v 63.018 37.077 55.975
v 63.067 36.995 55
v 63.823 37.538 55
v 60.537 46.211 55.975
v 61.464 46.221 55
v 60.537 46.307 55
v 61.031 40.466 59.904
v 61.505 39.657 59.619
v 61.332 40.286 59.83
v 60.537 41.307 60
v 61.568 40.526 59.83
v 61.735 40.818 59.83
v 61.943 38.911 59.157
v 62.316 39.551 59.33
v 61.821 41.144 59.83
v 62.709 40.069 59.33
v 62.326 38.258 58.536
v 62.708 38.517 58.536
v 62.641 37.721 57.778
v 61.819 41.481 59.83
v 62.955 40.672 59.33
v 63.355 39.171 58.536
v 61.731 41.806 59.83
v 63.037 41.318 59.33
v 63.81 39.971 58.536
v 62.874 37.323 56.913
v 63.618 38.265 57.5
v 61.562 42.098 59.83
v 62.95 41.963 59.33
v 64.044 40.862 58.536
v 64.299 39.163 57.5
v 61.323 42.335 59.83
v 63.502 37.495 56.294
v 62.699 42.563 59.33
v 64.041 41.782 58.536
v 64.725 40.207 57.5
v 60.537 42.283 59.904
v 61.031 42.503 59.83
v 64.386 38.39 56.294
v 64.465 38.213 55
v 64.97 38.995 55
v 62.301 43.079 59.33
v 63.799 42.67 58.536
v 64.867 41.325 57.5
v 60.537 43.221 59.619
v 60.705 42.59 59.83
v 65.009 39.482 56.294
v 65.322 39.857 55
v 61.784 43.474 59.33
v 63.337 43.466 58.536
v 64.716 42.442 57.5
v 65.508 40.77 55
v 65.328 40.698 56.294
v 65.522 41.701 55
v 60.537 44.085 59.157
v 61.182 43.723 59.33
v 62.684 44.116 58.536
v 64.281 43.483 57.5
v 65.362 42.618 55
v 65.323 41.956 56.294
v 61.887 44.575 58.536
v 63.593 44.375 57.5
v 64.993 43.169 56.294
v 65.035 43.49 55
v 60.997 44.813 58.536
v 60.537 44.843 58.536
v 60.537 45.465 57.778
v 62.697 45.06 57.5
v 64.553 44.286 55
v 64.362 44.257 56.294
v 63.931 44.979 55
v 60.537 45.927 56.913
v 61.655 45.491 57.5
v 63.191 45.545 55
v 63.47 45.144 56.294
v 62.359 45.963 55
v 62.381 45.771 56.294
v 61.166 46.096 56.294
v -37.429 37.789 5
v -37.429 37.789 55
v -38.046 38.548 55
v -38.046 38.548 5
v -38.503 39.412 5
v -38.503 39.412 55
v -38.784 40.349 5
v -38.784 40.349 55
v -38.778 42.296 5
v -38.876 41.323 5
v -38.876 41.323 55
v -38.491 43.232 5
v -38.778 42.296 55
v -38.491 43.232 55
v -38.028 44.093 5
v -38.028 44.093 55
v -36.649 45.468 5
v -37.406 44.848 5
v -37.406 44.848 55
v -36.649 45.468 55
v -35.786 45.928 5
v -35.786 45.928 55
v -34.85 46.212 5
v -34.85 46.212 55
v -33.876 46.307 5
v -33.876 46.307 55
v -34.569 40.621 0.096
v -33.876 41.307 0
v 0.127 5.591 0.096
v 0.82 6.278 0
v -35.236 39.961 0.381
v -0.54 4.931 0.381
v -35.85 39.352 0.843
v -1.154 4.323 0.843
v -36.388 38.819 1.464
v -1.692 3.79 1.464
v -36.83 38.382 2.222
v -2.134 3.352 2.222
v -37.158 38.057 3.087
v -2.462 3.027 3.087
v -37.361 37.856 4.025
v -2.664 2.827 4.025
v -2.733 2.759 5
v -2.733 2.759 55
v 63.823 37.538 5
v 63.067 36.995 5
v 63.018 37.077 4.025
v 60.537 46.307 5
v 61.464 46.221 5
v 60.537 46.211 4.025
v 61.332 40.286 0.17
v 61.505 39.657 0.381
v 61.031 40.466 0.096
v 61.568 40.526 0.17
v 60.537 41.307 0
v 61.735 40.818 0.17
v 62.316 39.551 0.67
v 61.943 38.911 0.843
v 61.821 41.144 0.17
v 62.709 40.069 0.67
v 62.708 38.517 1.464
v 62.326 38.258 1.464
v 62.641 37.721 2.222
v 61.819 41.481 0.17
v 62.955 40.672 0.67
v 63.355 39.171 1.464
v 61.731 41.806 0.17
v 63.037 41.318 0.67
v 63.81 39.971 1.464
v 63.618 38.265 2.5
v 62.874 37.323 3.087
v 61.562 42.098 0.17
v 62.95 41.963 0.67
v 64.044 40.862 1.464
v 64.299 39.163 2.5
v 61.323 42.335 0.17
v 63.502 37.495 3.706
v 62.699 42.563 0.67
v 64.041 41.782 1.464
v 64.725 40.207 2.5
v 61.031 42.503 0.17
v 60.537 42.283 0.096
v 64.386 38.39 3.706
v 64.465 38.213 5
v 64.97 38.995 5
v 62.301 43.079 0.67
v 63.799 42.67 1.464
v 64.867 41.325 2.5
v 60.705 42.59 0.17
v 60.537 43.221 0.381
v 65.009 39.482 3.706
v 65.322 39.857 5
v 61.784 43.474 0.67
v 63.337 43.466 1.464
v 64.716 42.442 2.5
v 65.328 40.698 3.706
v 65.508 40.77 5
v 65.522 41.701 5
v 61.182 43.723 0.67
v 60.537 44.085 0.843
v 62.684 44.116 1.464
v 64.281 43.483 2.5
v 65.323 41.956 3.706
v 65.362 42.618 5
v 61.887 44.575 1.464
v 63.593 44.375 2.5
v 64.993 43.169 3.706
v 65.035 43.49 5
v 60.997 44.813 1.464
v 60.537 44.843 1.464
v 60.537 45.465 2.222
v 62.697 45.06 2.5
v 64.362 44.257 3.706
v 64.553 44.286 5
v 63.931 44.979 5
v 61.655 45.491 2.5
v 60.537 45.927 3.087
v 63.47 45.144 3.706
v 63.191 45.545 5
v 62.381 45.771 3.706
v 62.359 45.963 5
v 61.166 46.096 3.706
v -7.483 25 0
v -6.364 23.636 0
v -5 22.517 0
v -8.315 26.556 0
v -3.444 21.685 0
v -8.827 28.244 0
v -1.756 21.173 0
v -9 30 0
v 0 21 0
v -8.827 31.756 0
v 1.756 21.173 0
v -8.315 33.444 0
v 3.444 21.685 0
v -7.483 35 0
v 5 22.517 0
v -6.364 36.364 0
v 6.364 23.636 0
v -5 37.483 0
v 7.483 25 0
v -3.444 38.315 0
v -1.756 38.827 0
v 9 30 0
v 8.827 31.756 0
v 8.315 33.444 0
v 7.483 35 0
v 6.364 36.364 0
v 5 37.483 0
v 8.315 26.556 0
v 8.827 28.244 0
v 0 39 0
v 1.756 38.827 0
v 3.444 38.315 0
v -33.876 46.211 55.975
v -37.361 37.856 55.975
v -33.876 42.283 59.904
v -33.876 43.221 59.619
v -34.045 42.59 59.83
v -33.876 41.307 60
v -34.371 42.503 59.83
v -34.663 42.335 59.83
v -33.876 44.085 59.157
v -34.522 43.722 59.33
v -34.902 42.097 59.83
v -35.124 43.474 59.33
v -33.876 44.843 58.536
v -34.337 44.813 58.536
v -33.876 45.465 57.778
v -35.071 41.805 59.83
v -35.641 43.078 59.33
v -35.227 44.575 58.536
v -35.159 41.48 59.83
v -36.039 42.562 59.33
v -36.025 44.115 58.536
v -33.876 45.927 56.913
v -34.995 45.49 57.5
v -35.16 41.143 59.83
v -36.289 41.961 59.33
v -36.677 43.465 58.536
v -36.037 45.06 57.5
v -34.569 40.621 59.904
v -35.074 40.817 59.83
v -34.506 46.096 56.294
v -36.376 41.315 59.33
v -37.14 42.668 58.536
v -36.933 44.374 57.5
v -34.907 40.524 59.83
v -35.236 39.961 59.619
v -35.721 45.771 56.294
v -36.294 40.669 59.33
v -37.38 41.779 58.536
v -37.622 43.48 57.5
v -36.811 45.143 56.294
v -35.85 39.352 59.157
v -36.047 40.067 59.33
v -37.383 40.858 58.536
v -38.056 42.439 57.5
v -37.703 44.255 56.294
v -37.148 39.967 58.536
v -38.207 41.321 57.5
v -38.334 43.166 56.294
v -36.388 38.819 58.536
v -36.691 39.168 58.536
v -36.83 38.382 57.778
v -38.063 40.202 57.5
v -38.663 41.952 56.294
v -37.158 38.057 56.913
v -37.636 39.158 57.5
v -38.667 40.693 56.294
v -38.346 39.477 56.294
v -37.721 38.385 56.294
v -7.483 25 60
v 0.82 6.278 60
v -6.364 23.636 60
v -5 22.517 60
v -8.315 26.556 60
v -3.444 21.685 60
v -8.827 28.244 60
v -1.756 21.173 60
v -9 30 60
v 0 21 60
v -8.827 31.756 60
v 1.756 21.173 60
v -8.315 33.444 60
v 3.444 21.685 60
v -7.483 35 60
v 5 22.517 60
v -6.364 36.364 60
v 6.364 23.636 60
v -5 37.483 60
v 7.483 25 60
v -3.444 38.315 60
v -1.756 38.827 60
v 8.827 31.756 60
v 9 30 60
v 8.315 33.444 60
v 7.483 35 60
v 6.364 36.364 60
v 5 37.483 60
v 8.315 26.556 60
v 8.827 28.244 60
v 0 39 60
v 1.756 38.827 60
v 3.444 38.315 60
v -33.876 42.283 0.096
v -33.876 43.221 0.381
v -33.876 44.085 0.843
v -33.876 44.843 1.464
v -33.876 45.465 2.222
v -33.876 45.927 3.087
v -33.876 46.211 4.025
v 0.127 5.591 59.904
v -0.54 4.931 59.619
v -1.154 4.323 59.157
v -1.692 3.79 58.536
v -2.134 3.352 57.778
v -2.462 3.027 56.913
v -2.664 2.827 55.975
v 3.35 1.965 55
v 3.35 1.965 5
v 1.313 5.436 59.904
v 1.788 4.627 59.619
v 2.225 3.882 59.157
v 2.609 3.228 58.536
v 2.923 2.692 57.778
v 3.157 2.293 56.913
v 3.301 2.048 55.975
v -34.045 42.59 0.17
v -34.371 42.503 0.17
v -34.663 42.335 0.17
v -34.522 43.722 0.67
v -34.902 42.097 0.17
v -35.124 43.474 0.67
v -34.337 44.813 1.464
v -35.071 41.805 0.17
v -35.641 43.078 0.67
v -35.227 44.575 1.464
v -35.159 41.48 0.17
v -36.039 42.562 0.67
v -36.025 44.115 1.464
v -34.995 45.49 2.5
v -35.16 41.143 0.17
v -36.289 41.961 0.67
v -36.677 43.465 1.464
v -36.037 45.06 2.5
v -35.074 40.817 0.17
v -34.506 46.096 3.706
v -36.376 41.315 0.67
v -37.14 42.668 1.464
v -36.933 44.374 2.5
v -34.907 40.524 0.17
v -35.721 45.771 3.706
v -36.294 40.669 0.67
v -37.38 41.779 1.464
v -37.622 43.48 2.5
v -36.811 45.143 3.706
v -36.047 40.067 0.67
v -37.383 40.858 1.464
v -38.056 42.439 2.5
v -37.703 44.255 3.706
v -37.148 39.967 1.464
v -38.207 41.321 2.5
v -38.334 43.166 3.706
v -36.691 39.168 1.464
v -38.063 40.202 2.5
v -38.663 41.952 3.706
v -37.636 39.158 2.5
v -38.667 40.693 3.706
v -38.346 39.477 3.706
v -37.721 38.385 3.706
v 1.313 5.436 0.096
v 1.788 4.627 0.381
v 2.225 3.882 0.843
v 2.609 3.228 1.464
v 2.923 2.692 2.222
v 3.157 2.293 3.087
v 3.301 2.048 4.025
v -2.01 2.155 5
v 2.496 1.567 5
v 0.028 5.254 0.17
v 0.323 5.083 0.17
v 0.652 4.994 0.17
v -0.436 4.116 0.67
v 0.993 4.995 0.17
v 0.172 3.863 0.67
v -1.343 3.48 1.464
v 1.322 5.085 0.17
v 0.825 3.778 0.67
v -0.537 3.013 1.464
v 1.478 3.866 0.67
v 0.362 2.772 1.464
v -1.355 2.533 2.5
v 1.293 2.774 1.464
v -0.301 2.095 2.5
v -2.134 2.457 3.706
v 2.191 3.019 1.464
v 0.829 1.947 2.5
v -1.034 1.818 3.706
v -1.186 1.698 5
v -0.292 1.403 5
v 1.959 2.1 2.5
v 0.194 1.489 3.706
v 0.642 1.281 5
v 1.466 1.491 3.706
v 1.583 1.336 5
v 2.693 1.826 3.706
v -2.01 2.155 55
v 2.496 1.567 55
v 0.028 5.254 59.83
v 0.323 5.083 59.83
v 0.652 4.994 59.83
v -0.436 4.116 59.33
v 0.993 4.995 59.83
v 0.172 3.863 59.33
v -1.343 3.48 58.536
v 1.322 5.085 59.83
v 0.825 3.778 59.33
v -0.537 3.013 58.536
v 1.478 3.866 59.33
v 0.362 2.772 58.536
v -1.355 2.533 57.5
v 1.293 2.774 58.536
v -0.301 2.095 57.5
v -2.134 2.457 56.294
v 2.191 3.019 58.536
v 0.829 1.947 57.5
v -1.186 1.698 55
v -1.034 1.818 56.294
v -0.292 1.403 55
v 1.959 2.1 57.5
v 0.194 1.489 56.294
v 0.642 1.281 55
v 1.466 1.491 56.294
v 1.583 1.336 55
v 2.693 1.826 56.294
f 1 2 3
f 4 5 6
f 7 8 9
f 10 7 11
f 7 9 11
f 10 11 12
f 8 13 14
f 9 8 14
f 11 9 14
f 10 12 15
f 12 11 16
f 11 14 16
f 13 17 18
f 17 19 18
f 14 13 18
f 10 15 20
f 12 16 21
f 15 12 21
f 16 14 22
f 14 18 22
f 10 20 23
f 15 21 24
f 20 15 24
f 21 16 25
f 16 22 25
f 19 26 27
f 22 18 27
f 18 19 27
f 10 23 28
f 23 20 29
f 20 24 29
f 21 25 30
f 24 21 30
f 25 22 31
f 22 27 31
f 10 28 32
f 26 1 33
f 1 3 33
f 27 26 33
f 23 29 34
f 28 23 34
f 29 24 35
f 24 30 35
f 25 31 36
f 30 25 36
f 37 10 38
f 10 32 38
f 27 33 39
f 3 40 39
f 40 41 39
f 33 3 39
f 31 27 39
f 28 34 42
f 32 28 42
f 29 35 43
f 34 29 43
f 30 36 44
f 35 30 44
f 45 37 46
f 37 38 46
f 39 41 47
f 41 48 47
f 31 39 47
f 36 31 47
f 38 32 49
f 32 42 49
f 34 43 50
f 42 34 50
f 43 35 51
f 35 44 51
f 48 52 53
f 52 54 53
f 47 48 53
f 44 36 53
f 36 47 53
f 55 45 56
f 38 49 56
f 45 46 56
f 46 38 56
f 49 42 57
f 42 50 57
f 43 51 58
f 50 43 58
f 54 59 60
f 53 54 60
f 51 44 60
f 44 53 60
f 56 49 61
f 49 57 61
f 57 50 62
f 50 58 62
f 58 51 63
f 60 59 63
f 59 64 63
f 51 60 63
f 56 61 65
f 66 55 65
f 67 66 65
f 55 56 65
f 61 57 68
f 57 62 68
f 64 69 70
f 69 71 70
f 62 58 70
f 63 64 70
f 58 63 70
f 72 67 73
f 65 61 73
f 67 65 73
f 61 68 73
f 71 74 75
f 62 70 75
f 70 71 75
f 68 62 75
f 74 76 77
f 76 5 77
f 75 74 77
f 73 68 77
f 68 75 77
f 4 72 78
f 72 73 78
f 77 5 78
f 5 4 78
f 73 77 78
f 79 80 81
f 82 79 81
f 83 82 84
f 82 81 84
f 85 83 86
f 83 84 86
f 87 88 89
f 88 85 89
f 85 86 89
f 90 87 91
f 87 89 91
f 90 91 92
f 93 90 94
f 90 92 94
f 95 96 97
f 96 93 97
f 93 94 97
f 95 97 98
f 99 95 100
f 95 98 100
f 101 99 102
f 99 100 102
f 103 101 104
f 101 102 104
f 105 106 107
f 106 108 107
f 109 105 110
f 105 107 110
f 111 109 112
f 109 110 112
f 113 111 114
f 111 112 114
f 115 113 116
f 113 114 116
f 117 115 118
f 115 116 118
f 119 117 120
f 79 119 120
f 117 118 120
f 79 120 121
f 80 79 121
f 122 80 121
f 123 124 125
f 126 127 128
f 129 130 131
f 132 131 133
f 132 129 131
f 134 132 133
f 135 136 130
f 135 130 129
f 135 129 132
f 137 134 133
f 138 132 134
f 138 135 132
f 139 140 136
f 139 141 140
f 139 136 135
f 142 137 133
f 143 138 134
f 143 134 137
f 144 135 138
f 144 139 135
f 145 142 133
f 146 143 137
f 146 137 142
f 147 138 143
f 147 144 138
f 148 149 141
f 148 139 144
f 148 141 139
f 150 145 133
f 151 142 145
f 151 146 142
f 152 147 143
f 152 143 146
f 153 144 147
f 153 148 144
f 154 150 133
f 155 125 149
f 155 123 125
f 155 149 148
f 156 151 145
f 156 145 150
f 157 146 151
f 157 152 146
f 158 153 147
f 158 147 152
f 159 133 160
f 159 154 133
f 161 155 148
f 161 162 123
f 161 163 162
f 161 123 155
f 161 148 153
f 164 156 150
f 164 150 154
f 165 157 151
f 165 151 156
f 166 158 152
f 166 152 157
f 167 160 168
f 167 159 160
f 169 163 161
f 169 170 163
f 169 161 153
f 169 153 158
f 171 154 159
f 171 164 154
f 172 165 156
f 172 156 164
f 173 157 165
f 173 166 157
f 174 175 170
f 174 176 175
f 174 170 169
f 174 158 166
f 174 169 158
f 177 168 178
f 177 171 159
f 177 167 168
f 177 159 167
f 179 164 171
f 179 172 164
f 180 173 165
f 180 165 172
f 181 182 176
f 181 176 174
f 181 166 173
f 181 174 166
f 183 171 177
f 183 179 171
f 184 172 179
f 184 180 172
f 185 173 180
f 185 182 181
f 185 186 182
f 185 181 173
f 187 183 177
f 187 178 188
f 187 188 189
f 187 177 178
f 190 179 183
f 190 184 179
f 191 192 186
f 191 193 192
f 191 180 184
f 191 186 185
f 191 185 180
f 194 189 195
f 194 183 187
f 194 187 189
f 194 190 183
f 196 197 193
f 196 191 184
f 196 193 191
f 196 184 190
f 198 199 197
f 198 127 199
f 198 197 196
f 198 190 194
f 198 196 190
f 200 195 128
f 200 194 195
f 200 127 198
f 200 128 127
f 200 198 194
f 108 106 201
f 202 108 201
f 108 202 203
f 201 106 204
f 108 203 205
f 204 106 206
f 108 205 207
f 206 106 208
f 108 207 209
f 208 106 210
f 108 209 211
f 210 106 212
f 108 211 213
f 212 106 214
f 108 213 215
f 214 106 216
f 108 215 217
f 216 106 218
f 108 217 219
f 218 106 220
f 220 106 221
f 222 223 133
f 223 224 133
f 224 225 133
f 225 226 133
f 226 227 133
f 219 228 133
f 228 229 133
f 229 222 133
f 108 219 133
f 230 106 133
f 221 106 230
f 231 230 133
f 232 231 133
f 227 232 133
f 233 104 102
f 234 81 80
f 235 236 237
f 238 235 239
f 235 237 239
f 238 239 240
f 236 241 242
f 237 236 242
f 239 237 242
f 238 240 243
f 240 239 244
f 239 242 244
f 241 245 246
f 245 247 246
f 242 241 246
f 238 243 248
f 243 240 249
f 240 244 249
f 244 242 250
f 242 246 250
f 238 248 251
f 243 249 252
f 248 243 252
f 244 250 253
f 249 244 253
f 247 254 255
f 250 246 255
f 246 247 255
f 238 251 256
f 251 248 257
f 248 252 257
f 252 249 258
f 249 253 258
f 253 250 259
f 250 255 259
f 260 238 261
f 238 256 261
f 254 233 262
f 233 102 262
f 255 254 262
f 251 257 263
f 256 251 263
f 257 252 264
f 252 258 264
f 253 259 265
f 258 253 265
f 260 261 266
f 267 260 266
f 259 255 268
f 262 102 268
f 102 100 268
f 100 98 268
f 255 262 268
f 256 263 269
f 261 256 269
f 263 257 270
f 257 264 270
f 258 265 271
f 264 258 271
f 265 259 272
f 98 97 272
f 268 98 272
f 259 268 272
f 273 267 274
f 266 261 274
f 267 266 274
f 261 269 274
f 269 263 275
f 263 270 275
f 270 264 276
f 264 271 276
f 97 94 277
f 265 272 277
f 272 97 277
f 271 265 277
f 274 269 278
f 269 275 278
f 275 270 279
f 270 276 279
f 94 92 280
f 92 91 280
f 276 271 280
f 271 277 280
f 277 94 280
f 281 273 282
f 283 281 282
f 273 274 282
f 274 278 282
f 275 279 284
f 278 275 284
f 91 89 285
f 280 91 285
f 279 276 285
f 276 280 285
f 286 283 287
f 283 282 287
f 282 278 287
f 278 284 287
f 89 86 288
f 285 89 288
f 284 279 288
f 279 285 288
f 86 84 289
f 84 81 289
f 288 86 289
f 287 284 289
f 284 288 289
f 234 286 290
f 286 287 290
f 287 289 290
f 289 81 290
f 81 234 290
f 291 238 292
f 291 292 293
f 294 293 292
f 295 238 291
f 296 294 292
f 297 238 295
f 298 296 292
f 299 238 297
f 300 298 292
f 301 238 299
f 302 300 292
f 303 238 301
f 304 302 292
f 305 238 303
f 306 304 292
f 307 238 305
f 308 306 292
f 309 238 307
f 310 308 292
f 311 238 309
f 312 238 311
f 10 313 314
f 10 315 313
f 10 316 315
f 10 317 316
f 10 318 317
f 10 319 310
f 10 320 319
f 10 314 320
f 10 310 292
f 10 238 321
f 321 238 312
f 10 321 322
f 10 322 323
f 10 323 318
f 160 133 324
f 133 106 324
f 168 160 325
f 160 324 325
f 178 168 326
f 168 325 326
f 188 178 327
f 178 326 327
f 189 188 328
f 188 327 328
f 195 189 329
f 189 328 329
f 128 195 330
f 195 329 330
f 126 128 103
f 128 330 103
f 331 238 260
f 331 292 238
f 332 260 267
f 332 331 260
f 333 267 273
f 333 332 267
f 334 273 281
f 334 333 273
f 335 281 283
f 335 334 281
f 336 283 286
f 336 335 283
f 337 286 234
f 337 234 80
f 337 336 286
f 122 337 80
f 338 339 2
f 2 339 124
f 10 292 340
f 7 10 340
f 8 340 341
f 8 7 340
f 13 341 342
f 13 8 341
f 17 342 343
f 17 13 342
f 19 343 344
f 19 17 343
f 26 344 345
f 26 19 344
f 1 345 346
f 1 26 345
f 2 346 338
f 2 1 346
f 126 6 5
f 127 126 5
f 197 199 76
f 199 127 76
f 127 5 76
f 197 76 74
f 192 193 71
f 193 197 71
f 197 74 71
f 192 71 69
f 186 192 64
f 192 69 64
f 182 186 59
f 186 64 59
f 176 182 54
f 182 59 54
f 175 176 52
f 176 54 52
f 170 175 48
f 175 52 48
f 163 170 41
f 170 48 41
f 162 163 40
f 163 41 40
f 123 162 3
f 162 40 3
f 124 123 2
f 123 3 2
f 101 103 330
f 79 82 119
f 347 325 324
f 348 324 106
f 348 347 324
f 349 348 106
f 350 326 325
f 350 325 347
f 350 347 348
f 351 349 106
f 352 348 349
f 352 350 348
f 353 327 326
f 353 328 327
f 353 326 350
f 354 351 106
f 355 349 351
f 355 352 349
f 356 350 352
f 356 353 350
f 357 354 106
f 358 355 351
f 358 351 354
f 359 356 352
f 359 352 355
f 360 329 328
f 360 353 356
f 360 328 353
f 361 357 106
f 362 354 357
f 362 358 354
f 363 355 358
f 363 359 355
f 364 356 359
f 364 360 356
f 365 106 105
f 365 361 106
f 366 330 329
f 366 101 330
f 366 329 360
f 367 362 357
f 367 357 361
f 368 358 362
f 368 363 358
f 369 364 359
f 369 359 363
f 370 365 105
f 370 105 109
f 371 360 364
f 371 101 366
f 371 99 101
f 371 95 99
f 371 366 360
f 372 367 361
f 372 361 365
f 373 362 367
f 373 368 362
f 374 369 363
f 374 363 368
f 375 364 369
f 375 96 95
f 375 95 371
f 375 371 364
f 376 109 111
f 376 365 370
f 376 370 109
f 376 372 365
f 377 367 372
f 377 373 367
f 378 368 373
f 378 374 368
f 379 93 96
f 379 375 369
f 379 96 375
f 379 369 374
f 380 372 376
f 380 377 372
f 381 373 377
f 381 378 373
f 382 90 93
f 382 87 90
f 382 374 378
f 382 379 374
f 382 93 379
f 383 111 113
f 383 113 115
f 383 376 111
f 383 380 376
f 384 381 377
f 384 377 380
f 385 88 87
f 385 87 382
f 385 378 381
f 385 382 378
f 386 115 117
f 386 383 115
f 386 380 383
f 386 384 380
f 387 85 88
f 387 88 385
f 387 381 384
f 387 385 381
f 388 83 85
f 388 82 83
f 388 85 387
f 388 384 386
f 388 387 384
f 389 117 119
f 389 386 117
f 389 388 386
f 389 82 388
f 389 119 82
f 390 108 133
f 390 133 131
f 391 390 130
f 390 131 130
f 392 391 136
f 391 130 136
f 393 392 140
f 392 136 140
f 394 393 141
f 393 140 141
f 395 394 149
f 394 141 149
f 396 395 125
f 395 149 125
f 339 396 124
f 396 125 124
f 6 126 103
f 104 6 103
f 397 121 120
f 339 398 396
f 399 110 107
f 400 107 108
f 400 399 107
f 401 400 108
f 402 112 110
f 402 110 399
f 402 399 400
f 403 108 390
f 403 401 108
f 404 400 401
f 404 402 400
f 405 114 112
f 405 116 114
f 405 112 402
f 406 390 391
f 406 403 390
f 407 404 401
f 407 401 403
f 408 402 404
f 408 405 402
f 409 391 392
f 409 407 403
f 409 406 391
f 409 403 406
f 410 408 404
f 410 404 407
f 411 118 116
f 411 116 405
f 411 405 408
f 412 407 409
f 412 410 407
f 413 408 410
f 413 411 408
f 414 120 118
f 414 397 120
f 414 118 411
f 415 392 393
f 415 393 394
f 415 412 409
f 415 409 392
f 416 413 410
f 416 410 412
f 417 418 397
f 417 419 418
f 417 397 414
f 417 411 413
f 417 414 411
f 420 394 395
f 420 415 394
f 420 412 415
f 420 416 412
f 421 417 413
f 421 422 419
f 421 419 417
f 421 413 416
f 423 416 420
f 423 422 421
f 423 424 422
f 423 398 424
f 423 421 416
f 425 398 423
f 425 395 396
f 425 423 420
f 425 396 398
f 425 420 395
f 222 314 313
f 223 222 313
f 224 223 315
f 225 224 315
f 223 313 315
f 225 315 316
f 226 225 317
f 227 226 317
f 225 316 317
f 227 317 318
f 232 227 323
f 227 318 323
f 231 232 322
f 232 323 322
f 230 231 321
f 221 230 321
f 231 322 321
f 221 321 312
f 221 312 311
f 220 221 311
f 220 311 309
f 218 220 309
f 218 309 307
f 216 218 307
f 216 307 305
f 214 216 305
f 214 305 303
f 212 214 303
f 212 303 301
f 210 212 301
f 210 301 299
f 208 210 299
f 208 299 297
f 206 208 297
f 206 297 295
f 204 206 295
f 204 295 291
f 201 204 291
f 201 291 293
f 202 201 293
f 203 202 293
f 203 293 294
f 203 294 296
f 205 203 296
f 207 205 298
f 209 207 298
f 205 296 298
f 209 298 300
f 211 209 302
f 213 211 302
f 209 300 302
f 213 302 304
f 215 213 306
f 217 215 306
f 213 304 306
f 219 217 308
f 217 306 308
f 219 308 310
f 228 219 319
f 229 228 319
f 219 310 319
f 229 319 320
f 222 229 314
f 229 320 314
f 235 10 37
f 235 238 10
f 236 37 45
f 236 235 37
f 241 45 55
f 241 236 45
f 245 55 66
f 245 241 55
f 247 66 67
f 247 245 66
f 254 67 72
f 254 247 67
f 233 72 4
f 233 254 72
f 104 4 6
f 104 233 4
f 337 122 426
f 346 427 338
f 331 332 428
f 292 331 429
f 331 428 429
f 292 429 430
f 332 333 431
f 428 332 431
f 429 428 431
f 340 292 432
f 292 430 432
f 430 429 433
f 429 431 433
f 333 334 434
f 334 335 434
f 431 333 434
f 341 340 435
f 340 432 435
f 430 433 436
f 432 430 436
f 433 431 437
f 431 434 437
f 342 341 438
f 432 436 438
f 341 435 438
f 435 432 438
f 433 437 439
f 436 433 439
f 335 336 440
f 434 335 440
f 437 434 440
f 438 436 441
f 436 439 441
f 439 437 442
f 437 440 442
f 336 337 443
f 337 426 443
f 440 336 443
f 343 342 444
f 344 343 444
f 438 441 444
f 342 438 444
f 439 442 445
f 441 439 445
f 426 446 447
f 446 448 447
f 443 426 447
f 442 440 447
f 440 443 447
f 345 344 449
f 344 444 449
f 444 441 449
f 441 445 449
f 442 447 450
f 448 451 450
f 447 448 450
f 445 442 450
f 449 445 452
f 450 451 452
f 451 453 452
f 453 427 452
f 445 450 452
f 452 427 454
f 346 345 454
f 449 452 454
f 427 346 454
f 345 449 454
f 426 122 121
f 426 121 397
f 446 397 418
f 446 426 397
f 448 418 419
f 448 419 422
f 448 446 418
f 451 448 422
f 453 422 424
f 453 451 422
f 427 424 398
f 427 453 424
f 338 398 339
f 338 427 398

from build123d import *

# Parameters (mm, degrees)
F1_DEPTH = 60
F2_R     = 9
F3_DEPTH = 60.001
F4_R     = 5
F5_R     = 5


with BuildPart() as f1:
    # F0 (on Top) → F1 (new body)
    with BuildSketch(Plane.XY):
        Polygon((-45.866266, 46.307288), (0, 0), (78.942902, 46.307288), align=None)
    extrude(amount=F1_DEPTH)

    # F2 (on face) → F3 (cut, through all)
    with BuildSketch(Plane.XY.offset(60)):
        with Locations((0, 30)):
            Circle(F2_R)
    extrude(amount=-F3_DEPTH, mode=Mode.SUBTRACT)

    # F4
    f4_edges = [f1.edges().sort_by_distance(p)[0] for p in [
        (-45.866266, 46.307288, 30),
        (0, 0, 30),
        (78.942902, 46.307288, 30),
    ]]
    fillet(f4_edges, radius=F4_R)

    # F5
    f5_edges = [f1.edges().sort_by_distance(p)[0] for p in [
        (33.208191, 19.479665, 0),
        (33.208191, 19.479665, 60),
    ]]
    fillet(f5_edges, radius=F5_R)


solid = f1.part
